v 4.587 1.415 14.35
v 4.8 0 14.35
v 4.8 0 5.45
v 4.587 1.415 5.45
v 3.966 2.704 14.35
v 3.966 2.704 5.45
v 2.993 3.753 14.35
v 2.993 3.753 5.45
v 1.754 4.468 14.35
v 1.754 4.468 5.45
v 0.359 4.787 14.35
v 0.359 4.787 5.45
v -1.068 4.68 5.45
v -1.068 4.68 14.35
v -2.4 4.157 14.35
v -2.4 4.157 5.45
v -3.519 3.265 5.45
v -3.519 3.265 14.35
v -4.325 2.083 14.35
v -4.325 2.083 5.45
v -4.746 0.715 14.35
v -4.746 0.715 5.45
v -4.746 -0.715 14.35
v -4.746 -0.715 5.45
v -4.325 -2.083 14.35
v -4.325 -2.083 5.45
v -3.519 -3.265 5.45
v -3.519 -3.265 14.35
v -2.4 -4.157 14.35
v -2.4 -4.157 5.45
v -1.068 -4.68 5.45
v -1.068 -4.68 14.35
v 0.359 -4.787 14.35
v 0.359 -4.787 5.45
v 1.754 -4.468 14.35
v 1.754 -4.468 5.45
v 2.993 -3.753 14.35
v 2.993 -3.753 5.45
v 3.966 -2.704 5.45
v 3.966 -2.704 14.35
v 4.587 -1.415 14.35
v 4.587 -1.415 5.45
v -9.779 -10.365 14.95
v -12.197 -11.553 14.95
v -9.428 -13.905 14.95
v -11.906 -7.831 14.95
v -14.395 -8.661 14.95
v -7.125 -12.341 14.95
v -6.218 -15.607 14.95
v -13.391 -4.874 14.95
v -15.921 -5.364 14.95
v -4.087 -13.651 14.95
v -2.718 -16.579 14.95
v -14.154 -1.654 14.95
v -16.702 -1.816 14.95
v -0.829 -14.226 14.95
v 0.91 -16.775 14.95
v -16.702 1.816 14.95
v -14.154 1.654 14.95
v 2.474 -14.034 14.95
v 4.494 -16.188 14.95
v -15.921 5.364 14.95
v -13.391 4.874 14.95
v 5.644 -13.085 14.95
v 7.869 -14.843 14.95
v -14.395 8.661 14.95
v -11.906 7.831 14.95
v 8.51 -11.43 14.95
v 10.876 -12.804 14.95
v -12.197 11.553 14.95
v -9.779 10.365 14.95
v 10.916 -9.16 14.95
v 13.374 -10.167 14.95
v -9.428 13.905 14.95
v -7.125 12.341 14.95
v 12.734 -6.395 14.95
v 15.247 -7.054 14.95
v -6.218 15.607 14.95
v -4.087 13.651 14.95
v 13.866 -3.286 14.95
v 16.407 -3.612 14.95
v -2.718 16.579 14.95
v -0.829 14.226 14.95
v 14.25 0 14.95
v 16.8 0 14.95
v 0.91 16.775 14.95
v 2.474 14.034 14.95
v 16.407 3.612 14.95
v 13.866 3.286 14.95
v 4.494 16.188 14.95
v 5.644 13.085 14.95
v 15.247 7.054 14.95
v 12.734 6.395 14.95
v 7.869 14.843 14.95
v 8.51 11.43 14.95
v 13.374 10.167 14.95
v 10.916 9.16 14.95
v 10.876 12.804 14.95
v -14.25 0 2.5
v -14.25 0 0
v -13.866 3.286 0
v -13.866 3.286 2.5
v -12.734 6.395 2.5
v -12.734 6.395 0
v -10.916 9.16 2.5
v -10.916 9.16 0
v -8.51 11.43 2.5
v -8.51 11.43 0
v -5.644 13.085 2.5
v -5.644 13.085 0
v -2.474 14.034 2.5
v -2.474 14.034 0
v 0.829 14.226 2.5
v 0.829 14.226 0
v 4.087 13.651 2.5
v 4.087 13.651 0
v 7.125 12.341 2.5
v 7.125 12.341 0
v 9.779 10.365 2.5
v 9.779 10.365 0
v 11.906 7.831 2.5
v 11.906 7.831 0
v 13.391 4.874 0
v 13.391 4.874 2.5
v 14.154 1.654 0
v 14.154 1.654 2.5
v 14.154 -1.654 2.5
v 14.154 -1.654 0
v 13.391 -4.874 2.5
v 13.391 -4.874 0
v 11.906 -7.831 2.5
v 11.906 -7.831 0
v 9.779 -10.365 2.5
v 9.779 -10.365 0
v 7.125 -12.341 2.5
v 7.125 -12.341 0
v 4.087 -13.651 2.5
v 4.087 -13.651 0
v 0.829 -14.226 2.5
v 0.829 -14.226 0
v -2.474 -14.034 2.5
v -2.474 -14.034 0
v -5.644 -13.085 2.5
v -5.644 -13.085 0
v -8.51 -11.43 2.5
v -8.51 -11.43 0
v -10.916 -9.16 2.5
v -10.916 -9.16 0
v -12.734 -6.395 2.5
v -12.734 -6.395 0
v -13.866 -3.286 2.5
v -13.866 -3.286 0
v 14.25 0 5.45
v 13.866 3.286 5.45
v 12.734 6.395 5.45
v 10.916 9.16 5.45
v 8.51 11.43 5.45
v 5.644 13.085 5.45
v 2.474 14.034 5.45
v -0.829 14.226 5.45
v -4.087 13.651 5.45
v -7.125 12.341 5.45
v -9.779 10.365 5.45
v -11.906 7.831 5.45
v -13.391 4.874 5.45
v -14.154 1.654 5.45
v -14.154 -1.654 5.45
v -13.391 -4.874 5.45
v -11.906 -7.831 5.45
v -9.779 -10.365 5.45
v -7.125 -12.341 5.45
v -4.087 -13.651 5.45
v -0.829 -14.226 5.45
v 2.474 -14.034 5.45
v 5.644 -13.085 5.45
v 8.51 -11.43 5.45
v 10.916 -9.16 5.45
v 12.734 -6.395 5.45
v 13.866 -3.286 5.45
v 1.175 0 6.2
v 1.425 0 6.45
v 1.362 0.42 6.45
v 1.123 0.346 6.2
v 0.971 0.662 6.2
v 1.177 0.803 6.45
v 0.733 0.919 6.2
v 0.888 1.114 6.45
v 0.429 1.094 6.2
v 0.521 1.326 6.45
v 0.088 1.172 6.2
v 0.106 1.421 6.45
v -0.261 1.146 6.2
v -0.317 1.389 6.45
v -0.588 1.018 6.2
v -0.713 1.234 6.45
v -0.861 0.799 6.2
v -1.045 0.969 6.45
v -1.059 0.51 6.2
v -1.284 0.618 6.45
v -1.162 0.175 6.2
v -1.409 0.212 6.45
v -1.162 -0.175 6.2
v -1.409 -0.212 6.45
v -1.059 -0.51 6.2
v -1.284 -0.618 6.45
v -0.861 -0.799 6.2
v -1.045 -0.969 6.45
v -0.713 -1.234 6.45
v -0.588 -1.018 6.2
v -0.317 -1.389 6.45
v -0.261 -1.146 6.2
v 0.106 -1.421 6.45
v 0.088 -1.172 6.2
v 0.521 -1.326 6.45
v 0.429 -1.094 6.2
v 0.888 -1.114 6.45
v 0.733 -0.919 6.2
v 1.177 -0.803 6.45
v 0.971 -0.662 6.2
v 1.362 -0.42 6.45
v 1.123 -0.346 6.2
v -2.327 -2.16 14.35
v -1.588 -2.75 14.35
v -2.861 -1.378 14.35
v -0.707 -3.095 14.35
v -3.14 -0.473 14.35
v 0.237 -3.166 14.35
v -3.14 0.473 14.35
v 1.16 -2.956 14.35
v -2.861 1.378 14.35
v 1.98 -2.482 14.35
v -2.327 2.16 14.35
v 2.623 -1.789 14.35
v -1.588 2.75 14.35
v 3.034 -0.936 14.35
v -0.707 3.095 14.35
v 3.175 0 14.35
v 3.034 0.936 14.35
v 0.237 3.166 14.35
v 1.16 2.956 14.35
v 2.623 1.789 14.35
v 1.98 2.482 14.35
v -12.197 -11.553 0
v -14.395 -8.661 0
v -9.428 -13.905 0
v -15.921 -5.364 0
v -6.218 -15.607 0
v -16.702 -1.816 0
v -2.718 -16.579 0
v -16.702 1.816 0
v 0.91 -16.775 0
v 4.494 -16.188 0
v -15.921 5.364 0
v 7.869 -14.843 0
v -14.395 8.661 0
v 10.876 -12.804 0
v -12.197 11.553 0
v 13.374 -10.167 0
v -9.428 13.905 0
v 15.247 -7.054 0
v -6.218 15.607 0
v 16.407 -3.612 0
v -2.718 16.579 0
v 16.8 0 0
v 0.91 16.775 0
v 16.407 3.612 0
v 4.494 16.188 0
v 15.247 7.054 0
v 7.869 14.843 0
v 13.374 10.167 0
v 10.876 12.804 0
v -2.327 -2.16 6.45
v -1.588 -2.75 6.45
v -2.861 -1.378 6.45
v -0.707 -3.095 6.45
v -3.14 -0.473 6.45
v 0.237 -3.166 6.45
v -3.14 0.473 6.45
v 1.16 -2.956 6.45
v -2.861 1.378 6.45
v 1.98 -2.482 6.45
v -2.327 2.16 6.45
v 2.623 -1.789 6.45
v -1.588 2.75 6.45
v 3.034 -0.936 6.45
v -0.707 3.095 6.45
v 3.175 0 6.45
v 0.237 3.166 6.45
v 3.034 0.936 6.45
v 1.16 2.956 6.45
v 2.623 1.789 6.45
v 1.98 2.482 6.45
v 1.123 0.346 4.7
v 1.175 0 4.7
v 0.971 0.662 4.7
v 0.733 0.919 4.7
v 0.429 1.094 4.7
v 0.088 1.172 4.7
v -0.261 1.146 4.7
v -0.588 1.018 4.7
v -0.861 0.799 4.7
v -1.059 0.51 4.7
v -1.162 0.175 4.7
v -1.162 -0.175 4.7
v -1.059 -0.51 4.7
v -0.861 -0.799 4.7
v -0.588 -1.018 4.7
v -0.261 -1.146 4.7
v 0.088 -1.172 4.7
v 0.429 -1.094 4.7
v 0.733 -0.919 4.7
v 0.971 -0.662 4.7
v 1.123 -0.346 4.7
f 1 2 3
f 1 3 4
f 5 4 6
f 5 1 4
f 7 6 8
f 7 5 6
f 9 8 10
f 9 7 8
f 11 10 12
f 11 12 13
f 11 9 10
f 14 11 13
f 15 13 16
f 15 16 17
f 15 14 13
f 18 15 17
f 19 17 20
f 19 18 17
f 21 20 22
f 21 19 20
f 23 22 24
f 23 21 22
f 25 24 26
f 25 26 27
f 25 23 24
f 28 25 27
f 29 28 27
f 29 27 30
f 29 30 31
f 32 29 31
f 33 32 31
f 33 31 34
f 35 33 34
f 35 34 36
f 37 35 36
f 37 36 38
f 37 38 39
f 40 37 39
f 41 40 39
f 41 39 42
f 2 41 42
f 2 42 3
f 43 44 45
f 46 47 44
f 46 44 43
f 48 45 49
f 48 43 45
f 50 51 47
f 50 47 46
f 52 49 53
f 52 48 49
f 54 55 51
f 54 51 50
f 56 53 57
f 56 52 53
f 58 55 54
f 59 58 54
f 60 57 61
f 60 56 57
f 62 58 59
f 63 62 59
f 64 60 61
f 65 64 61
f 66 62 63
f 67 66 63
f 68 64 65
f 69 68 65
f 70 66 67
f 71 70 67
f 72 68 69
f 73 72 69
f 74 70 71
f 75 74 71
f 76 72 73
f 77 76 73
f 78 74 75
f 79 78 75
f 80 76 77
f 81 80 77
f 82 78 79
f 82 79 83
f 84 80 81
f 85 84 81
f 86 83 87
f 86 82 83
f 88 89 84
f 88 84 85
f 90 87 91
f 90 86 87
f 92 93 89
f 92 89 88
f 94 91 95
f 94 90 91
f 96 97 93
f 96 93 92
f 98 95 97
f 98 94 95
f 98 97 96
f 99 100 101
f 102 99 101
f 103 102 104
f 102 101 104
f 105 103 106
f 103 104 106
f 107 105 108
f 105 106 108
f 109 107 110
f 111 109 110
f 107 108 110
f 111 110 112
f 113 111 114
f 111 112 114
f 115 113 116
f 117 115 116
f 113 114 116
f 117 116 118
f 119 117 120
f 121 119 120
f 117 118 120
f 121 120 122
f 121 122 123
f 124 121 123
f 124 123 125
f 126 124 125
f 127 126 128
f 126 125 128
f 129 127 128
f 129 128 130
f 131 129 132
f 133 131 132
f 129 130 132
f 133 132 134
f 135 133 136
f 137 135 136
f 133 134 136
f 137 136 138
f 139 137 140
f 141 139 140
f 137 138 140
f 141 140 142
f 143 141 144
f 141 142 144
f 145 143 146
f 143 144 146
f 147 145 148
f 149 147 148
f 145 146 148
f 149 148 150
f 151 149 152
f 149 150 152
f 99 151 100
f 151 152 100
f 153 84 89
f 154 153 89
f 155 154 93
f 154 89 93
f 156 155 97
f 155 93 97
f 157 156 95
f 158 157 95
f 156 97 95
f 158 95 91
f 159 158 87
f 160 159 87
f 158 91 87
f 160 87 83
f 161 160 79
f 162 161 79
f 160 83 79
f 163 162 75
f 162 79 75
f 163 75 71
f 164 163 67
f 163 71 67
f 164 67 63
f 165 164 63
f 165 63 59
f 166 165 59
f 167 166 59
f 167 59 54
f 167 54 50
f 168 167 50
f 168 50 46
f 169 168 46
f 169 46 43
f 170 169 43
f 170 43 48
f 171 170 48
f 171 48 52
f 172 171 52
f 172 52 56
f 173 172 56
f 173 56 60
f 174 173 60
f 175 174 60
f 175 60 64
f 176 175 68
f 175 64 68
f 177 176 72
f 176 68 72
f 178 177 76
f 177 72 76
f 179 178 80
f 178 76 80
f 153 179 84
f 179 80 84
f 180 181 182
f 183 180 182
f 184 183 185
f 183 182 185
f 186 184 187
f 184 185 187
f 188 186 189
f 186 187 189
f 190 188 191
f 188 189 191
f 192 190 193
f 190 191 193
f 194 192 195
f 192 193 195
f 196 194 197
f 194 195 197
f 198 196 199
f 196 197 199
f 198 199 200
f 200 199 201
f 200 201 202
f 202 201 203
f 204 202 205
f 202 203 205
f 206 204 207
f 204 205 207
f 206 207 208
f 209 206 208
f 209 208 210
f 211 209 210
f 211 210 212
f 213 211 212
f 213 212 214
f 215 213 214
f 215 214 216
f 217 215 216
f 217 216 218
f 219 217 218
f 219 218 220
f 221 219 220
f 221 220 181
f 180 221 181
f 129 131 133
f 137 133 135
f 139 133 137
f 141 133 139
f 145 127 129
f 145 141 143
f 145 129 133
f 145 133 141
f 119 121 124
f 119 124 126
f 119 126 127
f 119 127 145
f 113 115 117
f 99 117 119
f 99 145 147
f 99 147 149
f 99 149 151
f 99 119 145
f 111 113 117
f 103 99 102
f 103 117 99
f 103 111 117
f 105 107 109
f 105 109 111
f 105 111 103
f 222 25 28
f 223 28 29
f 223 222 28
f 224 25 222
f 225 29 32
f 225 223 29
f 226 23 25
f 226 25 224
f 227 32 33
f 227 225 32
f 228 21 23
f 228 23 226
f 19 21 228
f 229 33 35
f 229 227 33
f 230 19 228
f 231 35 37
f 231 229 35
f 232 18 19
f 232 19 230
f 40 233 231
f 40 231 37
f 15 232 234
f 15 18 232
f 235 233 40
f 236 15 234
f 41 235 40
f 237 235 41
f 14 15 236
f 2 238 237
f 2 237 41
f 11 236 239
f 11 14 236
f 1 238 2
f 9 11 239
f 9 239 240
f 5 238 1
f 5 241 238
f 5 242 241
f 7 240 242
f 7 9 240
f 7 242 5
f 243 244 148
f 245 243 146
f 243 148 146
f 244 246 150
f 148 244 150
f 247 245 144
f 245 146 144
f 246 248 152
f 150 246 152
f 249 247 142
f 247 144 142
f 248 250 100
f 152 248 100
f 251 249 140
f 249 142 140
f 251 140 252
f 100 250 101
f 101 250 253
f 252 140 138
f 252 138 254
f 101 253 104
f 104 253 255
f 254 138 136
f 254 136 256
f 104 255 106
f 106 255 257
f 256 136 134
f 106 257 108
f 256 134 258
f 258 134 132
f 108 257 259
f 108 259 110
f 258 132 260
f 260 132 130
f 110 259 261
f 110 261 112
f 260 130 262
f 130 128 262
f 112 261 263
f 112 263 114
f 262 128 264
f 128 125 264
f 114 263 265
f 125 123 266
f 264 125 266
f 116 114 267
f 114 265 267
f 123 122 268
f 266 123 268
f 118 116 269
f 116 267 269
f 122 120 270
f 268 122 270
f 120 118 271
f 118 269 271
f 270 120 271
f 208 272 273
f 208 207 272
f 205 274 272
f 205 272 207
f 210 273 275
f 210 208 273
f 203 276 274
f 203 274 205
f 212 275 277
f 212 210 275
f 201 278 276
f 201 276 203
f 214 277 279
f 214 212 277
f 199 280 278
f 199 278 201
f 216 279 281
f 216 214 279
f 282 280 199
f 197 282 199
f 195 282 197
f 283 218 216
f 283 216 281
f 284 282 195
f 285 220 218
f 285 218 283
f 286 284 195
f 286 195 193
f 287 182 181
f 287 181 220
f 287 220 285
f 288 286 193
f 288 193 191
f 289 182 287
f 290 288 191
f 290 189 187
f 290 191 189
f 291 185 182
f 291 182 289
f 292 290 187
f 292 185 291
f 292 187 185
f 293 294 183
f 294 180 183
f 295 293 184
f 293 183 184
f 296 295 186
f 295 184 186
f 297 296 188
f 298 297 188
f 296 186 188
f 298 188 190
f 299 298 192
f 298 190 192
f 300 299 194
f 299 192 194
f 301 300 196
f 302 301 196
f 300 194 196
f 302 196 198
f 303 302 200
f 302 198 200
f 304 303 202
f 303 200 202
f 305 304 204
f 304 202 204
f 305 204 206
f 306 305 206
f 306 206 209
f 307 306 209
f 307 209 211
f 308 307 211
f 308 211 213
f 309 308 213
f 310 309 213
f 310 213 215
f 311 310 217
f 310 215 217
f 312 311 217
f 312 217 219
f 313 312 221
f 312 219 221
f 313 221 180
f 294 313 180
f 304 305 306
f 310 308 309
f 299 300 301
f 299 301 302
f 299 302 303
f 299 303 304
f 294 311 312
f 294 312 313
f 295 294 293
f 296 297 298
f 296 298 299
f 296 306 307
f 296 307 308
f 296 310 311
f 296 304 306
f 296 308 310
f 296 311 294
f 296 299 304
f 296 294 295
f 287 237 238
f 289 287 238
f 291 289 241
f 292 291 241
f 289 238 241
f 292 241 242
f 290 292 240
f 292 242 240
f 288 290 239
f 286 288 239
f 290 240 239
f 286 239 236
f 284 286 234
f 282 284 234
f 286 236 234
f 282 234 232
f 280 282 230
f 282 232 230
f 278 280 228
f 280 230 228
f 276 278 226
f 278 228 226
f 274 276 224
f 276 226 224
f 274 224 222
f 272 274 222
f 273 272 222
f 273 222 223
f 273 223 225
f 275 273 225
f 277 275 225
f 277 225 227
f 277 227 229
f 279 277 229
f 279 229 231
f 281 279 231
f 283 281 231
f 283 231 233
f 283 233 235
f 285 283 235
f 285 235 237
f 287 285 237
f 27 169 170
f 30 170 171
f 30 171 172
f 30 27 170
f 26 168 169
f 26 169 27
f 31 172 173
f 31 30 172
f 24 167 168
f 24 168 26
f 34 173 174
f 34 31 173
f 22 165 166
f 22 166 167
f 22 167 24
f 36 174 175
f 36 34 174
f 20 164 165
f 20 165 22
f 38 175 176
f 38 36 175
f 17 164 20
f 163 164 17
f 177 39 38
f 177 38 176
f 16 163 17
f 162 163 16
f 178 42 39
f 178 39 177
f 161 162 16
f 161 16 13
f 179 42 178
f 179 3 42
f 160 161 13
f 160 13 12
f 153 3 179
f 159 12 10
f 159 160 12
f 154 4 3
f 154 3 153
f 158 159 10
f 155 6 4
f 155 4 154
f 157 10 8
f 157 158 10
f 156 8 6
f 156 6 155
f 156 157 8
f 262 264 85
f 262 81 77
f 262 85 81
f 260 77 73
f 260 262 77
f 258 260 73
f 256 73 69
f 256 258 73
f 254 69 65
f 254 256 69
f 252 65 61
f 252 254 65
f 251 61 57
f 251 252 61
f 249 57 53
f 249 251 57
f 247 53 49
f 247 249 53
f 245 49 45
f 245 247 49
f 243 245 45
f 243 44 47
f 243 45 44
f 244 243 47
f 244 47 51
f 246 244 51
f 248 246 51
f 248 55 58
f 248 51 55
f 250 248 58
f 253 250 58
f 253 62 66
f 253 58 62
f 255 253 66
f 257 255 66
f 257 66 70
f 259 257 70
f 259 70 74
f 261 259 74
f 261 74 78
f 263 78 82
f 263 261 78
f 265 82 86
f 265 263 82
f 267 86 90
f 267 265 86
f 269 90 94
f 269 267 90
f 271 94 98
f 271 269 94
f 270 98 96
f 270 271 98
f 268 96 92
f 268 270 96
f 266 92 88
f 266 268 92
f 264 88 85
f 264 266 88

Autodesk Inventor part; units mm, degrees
ref_plane "YZ Plane" through (0, 0, 0) normal (1, 0, 0) x (0, 1, 0)
ref_plane "XZ Plane" through (0, 0, 0) normal (0, 1, 0) x (-1, 0, 0)
ref_plane "XY Plane" through (0, 0, 0) normal (0, 0, 1) x (1, 0, 0)
sketch "Esboço1" plane through (0, 0, 0) normal (0, 0, 1) x (1, 0, 0)
  circle A0 centre (0, 0) radius 16.8
  dimension "d0" = 33.6
extrude "Extrusão1" add sketch "Esboço1" along normal blind 14.95
sketch "Esboço6" plane through (0, 0, 0) normal (0, 0, -1) x (-1, 0, 0)
  circle A0 centre (0, 0) radius 14.25
  dimension "d15" = 28.5
extrude "Extrusão6" cut sketch "Esboço6" against normal blind 2.5
sketch "Esboço7" plane through (0, 0, 14.95) normal (0, 0, 1) x (1, 0, 0)
  circle A0 centre (0, 0) radius 14.25
  circle A1 centre (0, 0) radius 4.8
  dimension "d18" = 28.5
  dimension "d19" = 9.6
extrude "Extrusão7" cut sketch "Esboço7" against normal blind 9.5
sketch "Esboço8" plane through (0, 0, 14.95) normal (0, 0, 1) x (1, 0, 0)
  circle A0 centre (0, 0) radius 4.8
extrude "Extrusão8" cut sketch "Esboço8" against normal blind 0.6
sketch "Esboço9" plane through (0, 0, 14.35) normal (0, 0, 1) x (1, 0, 0)
  circle A0 centre (0, 0) radius 4.8 projected
  circle A1 centre (0, 0) radius 3.175
  dimension "d24" = 6.35
extrude "Extrusão9" cut sketch "Esboço9" against normal blind 7.9 contours A1
sketch "Esboço10" plane through (0, 0, 6.45) normal (0, 0, 1) x (1, 0, 0)
  circle A0 centre (0, 0) radius 1.175
  dimension "d27" = 2.35
extrude "Extrusão10" cut sketch "Esboço10" against normal blind 1.75
chamfer "Chanfro1" distance 0.25 angle 45 1 edges at (-1.175, 0, 6.45)
properties part number "roda"
